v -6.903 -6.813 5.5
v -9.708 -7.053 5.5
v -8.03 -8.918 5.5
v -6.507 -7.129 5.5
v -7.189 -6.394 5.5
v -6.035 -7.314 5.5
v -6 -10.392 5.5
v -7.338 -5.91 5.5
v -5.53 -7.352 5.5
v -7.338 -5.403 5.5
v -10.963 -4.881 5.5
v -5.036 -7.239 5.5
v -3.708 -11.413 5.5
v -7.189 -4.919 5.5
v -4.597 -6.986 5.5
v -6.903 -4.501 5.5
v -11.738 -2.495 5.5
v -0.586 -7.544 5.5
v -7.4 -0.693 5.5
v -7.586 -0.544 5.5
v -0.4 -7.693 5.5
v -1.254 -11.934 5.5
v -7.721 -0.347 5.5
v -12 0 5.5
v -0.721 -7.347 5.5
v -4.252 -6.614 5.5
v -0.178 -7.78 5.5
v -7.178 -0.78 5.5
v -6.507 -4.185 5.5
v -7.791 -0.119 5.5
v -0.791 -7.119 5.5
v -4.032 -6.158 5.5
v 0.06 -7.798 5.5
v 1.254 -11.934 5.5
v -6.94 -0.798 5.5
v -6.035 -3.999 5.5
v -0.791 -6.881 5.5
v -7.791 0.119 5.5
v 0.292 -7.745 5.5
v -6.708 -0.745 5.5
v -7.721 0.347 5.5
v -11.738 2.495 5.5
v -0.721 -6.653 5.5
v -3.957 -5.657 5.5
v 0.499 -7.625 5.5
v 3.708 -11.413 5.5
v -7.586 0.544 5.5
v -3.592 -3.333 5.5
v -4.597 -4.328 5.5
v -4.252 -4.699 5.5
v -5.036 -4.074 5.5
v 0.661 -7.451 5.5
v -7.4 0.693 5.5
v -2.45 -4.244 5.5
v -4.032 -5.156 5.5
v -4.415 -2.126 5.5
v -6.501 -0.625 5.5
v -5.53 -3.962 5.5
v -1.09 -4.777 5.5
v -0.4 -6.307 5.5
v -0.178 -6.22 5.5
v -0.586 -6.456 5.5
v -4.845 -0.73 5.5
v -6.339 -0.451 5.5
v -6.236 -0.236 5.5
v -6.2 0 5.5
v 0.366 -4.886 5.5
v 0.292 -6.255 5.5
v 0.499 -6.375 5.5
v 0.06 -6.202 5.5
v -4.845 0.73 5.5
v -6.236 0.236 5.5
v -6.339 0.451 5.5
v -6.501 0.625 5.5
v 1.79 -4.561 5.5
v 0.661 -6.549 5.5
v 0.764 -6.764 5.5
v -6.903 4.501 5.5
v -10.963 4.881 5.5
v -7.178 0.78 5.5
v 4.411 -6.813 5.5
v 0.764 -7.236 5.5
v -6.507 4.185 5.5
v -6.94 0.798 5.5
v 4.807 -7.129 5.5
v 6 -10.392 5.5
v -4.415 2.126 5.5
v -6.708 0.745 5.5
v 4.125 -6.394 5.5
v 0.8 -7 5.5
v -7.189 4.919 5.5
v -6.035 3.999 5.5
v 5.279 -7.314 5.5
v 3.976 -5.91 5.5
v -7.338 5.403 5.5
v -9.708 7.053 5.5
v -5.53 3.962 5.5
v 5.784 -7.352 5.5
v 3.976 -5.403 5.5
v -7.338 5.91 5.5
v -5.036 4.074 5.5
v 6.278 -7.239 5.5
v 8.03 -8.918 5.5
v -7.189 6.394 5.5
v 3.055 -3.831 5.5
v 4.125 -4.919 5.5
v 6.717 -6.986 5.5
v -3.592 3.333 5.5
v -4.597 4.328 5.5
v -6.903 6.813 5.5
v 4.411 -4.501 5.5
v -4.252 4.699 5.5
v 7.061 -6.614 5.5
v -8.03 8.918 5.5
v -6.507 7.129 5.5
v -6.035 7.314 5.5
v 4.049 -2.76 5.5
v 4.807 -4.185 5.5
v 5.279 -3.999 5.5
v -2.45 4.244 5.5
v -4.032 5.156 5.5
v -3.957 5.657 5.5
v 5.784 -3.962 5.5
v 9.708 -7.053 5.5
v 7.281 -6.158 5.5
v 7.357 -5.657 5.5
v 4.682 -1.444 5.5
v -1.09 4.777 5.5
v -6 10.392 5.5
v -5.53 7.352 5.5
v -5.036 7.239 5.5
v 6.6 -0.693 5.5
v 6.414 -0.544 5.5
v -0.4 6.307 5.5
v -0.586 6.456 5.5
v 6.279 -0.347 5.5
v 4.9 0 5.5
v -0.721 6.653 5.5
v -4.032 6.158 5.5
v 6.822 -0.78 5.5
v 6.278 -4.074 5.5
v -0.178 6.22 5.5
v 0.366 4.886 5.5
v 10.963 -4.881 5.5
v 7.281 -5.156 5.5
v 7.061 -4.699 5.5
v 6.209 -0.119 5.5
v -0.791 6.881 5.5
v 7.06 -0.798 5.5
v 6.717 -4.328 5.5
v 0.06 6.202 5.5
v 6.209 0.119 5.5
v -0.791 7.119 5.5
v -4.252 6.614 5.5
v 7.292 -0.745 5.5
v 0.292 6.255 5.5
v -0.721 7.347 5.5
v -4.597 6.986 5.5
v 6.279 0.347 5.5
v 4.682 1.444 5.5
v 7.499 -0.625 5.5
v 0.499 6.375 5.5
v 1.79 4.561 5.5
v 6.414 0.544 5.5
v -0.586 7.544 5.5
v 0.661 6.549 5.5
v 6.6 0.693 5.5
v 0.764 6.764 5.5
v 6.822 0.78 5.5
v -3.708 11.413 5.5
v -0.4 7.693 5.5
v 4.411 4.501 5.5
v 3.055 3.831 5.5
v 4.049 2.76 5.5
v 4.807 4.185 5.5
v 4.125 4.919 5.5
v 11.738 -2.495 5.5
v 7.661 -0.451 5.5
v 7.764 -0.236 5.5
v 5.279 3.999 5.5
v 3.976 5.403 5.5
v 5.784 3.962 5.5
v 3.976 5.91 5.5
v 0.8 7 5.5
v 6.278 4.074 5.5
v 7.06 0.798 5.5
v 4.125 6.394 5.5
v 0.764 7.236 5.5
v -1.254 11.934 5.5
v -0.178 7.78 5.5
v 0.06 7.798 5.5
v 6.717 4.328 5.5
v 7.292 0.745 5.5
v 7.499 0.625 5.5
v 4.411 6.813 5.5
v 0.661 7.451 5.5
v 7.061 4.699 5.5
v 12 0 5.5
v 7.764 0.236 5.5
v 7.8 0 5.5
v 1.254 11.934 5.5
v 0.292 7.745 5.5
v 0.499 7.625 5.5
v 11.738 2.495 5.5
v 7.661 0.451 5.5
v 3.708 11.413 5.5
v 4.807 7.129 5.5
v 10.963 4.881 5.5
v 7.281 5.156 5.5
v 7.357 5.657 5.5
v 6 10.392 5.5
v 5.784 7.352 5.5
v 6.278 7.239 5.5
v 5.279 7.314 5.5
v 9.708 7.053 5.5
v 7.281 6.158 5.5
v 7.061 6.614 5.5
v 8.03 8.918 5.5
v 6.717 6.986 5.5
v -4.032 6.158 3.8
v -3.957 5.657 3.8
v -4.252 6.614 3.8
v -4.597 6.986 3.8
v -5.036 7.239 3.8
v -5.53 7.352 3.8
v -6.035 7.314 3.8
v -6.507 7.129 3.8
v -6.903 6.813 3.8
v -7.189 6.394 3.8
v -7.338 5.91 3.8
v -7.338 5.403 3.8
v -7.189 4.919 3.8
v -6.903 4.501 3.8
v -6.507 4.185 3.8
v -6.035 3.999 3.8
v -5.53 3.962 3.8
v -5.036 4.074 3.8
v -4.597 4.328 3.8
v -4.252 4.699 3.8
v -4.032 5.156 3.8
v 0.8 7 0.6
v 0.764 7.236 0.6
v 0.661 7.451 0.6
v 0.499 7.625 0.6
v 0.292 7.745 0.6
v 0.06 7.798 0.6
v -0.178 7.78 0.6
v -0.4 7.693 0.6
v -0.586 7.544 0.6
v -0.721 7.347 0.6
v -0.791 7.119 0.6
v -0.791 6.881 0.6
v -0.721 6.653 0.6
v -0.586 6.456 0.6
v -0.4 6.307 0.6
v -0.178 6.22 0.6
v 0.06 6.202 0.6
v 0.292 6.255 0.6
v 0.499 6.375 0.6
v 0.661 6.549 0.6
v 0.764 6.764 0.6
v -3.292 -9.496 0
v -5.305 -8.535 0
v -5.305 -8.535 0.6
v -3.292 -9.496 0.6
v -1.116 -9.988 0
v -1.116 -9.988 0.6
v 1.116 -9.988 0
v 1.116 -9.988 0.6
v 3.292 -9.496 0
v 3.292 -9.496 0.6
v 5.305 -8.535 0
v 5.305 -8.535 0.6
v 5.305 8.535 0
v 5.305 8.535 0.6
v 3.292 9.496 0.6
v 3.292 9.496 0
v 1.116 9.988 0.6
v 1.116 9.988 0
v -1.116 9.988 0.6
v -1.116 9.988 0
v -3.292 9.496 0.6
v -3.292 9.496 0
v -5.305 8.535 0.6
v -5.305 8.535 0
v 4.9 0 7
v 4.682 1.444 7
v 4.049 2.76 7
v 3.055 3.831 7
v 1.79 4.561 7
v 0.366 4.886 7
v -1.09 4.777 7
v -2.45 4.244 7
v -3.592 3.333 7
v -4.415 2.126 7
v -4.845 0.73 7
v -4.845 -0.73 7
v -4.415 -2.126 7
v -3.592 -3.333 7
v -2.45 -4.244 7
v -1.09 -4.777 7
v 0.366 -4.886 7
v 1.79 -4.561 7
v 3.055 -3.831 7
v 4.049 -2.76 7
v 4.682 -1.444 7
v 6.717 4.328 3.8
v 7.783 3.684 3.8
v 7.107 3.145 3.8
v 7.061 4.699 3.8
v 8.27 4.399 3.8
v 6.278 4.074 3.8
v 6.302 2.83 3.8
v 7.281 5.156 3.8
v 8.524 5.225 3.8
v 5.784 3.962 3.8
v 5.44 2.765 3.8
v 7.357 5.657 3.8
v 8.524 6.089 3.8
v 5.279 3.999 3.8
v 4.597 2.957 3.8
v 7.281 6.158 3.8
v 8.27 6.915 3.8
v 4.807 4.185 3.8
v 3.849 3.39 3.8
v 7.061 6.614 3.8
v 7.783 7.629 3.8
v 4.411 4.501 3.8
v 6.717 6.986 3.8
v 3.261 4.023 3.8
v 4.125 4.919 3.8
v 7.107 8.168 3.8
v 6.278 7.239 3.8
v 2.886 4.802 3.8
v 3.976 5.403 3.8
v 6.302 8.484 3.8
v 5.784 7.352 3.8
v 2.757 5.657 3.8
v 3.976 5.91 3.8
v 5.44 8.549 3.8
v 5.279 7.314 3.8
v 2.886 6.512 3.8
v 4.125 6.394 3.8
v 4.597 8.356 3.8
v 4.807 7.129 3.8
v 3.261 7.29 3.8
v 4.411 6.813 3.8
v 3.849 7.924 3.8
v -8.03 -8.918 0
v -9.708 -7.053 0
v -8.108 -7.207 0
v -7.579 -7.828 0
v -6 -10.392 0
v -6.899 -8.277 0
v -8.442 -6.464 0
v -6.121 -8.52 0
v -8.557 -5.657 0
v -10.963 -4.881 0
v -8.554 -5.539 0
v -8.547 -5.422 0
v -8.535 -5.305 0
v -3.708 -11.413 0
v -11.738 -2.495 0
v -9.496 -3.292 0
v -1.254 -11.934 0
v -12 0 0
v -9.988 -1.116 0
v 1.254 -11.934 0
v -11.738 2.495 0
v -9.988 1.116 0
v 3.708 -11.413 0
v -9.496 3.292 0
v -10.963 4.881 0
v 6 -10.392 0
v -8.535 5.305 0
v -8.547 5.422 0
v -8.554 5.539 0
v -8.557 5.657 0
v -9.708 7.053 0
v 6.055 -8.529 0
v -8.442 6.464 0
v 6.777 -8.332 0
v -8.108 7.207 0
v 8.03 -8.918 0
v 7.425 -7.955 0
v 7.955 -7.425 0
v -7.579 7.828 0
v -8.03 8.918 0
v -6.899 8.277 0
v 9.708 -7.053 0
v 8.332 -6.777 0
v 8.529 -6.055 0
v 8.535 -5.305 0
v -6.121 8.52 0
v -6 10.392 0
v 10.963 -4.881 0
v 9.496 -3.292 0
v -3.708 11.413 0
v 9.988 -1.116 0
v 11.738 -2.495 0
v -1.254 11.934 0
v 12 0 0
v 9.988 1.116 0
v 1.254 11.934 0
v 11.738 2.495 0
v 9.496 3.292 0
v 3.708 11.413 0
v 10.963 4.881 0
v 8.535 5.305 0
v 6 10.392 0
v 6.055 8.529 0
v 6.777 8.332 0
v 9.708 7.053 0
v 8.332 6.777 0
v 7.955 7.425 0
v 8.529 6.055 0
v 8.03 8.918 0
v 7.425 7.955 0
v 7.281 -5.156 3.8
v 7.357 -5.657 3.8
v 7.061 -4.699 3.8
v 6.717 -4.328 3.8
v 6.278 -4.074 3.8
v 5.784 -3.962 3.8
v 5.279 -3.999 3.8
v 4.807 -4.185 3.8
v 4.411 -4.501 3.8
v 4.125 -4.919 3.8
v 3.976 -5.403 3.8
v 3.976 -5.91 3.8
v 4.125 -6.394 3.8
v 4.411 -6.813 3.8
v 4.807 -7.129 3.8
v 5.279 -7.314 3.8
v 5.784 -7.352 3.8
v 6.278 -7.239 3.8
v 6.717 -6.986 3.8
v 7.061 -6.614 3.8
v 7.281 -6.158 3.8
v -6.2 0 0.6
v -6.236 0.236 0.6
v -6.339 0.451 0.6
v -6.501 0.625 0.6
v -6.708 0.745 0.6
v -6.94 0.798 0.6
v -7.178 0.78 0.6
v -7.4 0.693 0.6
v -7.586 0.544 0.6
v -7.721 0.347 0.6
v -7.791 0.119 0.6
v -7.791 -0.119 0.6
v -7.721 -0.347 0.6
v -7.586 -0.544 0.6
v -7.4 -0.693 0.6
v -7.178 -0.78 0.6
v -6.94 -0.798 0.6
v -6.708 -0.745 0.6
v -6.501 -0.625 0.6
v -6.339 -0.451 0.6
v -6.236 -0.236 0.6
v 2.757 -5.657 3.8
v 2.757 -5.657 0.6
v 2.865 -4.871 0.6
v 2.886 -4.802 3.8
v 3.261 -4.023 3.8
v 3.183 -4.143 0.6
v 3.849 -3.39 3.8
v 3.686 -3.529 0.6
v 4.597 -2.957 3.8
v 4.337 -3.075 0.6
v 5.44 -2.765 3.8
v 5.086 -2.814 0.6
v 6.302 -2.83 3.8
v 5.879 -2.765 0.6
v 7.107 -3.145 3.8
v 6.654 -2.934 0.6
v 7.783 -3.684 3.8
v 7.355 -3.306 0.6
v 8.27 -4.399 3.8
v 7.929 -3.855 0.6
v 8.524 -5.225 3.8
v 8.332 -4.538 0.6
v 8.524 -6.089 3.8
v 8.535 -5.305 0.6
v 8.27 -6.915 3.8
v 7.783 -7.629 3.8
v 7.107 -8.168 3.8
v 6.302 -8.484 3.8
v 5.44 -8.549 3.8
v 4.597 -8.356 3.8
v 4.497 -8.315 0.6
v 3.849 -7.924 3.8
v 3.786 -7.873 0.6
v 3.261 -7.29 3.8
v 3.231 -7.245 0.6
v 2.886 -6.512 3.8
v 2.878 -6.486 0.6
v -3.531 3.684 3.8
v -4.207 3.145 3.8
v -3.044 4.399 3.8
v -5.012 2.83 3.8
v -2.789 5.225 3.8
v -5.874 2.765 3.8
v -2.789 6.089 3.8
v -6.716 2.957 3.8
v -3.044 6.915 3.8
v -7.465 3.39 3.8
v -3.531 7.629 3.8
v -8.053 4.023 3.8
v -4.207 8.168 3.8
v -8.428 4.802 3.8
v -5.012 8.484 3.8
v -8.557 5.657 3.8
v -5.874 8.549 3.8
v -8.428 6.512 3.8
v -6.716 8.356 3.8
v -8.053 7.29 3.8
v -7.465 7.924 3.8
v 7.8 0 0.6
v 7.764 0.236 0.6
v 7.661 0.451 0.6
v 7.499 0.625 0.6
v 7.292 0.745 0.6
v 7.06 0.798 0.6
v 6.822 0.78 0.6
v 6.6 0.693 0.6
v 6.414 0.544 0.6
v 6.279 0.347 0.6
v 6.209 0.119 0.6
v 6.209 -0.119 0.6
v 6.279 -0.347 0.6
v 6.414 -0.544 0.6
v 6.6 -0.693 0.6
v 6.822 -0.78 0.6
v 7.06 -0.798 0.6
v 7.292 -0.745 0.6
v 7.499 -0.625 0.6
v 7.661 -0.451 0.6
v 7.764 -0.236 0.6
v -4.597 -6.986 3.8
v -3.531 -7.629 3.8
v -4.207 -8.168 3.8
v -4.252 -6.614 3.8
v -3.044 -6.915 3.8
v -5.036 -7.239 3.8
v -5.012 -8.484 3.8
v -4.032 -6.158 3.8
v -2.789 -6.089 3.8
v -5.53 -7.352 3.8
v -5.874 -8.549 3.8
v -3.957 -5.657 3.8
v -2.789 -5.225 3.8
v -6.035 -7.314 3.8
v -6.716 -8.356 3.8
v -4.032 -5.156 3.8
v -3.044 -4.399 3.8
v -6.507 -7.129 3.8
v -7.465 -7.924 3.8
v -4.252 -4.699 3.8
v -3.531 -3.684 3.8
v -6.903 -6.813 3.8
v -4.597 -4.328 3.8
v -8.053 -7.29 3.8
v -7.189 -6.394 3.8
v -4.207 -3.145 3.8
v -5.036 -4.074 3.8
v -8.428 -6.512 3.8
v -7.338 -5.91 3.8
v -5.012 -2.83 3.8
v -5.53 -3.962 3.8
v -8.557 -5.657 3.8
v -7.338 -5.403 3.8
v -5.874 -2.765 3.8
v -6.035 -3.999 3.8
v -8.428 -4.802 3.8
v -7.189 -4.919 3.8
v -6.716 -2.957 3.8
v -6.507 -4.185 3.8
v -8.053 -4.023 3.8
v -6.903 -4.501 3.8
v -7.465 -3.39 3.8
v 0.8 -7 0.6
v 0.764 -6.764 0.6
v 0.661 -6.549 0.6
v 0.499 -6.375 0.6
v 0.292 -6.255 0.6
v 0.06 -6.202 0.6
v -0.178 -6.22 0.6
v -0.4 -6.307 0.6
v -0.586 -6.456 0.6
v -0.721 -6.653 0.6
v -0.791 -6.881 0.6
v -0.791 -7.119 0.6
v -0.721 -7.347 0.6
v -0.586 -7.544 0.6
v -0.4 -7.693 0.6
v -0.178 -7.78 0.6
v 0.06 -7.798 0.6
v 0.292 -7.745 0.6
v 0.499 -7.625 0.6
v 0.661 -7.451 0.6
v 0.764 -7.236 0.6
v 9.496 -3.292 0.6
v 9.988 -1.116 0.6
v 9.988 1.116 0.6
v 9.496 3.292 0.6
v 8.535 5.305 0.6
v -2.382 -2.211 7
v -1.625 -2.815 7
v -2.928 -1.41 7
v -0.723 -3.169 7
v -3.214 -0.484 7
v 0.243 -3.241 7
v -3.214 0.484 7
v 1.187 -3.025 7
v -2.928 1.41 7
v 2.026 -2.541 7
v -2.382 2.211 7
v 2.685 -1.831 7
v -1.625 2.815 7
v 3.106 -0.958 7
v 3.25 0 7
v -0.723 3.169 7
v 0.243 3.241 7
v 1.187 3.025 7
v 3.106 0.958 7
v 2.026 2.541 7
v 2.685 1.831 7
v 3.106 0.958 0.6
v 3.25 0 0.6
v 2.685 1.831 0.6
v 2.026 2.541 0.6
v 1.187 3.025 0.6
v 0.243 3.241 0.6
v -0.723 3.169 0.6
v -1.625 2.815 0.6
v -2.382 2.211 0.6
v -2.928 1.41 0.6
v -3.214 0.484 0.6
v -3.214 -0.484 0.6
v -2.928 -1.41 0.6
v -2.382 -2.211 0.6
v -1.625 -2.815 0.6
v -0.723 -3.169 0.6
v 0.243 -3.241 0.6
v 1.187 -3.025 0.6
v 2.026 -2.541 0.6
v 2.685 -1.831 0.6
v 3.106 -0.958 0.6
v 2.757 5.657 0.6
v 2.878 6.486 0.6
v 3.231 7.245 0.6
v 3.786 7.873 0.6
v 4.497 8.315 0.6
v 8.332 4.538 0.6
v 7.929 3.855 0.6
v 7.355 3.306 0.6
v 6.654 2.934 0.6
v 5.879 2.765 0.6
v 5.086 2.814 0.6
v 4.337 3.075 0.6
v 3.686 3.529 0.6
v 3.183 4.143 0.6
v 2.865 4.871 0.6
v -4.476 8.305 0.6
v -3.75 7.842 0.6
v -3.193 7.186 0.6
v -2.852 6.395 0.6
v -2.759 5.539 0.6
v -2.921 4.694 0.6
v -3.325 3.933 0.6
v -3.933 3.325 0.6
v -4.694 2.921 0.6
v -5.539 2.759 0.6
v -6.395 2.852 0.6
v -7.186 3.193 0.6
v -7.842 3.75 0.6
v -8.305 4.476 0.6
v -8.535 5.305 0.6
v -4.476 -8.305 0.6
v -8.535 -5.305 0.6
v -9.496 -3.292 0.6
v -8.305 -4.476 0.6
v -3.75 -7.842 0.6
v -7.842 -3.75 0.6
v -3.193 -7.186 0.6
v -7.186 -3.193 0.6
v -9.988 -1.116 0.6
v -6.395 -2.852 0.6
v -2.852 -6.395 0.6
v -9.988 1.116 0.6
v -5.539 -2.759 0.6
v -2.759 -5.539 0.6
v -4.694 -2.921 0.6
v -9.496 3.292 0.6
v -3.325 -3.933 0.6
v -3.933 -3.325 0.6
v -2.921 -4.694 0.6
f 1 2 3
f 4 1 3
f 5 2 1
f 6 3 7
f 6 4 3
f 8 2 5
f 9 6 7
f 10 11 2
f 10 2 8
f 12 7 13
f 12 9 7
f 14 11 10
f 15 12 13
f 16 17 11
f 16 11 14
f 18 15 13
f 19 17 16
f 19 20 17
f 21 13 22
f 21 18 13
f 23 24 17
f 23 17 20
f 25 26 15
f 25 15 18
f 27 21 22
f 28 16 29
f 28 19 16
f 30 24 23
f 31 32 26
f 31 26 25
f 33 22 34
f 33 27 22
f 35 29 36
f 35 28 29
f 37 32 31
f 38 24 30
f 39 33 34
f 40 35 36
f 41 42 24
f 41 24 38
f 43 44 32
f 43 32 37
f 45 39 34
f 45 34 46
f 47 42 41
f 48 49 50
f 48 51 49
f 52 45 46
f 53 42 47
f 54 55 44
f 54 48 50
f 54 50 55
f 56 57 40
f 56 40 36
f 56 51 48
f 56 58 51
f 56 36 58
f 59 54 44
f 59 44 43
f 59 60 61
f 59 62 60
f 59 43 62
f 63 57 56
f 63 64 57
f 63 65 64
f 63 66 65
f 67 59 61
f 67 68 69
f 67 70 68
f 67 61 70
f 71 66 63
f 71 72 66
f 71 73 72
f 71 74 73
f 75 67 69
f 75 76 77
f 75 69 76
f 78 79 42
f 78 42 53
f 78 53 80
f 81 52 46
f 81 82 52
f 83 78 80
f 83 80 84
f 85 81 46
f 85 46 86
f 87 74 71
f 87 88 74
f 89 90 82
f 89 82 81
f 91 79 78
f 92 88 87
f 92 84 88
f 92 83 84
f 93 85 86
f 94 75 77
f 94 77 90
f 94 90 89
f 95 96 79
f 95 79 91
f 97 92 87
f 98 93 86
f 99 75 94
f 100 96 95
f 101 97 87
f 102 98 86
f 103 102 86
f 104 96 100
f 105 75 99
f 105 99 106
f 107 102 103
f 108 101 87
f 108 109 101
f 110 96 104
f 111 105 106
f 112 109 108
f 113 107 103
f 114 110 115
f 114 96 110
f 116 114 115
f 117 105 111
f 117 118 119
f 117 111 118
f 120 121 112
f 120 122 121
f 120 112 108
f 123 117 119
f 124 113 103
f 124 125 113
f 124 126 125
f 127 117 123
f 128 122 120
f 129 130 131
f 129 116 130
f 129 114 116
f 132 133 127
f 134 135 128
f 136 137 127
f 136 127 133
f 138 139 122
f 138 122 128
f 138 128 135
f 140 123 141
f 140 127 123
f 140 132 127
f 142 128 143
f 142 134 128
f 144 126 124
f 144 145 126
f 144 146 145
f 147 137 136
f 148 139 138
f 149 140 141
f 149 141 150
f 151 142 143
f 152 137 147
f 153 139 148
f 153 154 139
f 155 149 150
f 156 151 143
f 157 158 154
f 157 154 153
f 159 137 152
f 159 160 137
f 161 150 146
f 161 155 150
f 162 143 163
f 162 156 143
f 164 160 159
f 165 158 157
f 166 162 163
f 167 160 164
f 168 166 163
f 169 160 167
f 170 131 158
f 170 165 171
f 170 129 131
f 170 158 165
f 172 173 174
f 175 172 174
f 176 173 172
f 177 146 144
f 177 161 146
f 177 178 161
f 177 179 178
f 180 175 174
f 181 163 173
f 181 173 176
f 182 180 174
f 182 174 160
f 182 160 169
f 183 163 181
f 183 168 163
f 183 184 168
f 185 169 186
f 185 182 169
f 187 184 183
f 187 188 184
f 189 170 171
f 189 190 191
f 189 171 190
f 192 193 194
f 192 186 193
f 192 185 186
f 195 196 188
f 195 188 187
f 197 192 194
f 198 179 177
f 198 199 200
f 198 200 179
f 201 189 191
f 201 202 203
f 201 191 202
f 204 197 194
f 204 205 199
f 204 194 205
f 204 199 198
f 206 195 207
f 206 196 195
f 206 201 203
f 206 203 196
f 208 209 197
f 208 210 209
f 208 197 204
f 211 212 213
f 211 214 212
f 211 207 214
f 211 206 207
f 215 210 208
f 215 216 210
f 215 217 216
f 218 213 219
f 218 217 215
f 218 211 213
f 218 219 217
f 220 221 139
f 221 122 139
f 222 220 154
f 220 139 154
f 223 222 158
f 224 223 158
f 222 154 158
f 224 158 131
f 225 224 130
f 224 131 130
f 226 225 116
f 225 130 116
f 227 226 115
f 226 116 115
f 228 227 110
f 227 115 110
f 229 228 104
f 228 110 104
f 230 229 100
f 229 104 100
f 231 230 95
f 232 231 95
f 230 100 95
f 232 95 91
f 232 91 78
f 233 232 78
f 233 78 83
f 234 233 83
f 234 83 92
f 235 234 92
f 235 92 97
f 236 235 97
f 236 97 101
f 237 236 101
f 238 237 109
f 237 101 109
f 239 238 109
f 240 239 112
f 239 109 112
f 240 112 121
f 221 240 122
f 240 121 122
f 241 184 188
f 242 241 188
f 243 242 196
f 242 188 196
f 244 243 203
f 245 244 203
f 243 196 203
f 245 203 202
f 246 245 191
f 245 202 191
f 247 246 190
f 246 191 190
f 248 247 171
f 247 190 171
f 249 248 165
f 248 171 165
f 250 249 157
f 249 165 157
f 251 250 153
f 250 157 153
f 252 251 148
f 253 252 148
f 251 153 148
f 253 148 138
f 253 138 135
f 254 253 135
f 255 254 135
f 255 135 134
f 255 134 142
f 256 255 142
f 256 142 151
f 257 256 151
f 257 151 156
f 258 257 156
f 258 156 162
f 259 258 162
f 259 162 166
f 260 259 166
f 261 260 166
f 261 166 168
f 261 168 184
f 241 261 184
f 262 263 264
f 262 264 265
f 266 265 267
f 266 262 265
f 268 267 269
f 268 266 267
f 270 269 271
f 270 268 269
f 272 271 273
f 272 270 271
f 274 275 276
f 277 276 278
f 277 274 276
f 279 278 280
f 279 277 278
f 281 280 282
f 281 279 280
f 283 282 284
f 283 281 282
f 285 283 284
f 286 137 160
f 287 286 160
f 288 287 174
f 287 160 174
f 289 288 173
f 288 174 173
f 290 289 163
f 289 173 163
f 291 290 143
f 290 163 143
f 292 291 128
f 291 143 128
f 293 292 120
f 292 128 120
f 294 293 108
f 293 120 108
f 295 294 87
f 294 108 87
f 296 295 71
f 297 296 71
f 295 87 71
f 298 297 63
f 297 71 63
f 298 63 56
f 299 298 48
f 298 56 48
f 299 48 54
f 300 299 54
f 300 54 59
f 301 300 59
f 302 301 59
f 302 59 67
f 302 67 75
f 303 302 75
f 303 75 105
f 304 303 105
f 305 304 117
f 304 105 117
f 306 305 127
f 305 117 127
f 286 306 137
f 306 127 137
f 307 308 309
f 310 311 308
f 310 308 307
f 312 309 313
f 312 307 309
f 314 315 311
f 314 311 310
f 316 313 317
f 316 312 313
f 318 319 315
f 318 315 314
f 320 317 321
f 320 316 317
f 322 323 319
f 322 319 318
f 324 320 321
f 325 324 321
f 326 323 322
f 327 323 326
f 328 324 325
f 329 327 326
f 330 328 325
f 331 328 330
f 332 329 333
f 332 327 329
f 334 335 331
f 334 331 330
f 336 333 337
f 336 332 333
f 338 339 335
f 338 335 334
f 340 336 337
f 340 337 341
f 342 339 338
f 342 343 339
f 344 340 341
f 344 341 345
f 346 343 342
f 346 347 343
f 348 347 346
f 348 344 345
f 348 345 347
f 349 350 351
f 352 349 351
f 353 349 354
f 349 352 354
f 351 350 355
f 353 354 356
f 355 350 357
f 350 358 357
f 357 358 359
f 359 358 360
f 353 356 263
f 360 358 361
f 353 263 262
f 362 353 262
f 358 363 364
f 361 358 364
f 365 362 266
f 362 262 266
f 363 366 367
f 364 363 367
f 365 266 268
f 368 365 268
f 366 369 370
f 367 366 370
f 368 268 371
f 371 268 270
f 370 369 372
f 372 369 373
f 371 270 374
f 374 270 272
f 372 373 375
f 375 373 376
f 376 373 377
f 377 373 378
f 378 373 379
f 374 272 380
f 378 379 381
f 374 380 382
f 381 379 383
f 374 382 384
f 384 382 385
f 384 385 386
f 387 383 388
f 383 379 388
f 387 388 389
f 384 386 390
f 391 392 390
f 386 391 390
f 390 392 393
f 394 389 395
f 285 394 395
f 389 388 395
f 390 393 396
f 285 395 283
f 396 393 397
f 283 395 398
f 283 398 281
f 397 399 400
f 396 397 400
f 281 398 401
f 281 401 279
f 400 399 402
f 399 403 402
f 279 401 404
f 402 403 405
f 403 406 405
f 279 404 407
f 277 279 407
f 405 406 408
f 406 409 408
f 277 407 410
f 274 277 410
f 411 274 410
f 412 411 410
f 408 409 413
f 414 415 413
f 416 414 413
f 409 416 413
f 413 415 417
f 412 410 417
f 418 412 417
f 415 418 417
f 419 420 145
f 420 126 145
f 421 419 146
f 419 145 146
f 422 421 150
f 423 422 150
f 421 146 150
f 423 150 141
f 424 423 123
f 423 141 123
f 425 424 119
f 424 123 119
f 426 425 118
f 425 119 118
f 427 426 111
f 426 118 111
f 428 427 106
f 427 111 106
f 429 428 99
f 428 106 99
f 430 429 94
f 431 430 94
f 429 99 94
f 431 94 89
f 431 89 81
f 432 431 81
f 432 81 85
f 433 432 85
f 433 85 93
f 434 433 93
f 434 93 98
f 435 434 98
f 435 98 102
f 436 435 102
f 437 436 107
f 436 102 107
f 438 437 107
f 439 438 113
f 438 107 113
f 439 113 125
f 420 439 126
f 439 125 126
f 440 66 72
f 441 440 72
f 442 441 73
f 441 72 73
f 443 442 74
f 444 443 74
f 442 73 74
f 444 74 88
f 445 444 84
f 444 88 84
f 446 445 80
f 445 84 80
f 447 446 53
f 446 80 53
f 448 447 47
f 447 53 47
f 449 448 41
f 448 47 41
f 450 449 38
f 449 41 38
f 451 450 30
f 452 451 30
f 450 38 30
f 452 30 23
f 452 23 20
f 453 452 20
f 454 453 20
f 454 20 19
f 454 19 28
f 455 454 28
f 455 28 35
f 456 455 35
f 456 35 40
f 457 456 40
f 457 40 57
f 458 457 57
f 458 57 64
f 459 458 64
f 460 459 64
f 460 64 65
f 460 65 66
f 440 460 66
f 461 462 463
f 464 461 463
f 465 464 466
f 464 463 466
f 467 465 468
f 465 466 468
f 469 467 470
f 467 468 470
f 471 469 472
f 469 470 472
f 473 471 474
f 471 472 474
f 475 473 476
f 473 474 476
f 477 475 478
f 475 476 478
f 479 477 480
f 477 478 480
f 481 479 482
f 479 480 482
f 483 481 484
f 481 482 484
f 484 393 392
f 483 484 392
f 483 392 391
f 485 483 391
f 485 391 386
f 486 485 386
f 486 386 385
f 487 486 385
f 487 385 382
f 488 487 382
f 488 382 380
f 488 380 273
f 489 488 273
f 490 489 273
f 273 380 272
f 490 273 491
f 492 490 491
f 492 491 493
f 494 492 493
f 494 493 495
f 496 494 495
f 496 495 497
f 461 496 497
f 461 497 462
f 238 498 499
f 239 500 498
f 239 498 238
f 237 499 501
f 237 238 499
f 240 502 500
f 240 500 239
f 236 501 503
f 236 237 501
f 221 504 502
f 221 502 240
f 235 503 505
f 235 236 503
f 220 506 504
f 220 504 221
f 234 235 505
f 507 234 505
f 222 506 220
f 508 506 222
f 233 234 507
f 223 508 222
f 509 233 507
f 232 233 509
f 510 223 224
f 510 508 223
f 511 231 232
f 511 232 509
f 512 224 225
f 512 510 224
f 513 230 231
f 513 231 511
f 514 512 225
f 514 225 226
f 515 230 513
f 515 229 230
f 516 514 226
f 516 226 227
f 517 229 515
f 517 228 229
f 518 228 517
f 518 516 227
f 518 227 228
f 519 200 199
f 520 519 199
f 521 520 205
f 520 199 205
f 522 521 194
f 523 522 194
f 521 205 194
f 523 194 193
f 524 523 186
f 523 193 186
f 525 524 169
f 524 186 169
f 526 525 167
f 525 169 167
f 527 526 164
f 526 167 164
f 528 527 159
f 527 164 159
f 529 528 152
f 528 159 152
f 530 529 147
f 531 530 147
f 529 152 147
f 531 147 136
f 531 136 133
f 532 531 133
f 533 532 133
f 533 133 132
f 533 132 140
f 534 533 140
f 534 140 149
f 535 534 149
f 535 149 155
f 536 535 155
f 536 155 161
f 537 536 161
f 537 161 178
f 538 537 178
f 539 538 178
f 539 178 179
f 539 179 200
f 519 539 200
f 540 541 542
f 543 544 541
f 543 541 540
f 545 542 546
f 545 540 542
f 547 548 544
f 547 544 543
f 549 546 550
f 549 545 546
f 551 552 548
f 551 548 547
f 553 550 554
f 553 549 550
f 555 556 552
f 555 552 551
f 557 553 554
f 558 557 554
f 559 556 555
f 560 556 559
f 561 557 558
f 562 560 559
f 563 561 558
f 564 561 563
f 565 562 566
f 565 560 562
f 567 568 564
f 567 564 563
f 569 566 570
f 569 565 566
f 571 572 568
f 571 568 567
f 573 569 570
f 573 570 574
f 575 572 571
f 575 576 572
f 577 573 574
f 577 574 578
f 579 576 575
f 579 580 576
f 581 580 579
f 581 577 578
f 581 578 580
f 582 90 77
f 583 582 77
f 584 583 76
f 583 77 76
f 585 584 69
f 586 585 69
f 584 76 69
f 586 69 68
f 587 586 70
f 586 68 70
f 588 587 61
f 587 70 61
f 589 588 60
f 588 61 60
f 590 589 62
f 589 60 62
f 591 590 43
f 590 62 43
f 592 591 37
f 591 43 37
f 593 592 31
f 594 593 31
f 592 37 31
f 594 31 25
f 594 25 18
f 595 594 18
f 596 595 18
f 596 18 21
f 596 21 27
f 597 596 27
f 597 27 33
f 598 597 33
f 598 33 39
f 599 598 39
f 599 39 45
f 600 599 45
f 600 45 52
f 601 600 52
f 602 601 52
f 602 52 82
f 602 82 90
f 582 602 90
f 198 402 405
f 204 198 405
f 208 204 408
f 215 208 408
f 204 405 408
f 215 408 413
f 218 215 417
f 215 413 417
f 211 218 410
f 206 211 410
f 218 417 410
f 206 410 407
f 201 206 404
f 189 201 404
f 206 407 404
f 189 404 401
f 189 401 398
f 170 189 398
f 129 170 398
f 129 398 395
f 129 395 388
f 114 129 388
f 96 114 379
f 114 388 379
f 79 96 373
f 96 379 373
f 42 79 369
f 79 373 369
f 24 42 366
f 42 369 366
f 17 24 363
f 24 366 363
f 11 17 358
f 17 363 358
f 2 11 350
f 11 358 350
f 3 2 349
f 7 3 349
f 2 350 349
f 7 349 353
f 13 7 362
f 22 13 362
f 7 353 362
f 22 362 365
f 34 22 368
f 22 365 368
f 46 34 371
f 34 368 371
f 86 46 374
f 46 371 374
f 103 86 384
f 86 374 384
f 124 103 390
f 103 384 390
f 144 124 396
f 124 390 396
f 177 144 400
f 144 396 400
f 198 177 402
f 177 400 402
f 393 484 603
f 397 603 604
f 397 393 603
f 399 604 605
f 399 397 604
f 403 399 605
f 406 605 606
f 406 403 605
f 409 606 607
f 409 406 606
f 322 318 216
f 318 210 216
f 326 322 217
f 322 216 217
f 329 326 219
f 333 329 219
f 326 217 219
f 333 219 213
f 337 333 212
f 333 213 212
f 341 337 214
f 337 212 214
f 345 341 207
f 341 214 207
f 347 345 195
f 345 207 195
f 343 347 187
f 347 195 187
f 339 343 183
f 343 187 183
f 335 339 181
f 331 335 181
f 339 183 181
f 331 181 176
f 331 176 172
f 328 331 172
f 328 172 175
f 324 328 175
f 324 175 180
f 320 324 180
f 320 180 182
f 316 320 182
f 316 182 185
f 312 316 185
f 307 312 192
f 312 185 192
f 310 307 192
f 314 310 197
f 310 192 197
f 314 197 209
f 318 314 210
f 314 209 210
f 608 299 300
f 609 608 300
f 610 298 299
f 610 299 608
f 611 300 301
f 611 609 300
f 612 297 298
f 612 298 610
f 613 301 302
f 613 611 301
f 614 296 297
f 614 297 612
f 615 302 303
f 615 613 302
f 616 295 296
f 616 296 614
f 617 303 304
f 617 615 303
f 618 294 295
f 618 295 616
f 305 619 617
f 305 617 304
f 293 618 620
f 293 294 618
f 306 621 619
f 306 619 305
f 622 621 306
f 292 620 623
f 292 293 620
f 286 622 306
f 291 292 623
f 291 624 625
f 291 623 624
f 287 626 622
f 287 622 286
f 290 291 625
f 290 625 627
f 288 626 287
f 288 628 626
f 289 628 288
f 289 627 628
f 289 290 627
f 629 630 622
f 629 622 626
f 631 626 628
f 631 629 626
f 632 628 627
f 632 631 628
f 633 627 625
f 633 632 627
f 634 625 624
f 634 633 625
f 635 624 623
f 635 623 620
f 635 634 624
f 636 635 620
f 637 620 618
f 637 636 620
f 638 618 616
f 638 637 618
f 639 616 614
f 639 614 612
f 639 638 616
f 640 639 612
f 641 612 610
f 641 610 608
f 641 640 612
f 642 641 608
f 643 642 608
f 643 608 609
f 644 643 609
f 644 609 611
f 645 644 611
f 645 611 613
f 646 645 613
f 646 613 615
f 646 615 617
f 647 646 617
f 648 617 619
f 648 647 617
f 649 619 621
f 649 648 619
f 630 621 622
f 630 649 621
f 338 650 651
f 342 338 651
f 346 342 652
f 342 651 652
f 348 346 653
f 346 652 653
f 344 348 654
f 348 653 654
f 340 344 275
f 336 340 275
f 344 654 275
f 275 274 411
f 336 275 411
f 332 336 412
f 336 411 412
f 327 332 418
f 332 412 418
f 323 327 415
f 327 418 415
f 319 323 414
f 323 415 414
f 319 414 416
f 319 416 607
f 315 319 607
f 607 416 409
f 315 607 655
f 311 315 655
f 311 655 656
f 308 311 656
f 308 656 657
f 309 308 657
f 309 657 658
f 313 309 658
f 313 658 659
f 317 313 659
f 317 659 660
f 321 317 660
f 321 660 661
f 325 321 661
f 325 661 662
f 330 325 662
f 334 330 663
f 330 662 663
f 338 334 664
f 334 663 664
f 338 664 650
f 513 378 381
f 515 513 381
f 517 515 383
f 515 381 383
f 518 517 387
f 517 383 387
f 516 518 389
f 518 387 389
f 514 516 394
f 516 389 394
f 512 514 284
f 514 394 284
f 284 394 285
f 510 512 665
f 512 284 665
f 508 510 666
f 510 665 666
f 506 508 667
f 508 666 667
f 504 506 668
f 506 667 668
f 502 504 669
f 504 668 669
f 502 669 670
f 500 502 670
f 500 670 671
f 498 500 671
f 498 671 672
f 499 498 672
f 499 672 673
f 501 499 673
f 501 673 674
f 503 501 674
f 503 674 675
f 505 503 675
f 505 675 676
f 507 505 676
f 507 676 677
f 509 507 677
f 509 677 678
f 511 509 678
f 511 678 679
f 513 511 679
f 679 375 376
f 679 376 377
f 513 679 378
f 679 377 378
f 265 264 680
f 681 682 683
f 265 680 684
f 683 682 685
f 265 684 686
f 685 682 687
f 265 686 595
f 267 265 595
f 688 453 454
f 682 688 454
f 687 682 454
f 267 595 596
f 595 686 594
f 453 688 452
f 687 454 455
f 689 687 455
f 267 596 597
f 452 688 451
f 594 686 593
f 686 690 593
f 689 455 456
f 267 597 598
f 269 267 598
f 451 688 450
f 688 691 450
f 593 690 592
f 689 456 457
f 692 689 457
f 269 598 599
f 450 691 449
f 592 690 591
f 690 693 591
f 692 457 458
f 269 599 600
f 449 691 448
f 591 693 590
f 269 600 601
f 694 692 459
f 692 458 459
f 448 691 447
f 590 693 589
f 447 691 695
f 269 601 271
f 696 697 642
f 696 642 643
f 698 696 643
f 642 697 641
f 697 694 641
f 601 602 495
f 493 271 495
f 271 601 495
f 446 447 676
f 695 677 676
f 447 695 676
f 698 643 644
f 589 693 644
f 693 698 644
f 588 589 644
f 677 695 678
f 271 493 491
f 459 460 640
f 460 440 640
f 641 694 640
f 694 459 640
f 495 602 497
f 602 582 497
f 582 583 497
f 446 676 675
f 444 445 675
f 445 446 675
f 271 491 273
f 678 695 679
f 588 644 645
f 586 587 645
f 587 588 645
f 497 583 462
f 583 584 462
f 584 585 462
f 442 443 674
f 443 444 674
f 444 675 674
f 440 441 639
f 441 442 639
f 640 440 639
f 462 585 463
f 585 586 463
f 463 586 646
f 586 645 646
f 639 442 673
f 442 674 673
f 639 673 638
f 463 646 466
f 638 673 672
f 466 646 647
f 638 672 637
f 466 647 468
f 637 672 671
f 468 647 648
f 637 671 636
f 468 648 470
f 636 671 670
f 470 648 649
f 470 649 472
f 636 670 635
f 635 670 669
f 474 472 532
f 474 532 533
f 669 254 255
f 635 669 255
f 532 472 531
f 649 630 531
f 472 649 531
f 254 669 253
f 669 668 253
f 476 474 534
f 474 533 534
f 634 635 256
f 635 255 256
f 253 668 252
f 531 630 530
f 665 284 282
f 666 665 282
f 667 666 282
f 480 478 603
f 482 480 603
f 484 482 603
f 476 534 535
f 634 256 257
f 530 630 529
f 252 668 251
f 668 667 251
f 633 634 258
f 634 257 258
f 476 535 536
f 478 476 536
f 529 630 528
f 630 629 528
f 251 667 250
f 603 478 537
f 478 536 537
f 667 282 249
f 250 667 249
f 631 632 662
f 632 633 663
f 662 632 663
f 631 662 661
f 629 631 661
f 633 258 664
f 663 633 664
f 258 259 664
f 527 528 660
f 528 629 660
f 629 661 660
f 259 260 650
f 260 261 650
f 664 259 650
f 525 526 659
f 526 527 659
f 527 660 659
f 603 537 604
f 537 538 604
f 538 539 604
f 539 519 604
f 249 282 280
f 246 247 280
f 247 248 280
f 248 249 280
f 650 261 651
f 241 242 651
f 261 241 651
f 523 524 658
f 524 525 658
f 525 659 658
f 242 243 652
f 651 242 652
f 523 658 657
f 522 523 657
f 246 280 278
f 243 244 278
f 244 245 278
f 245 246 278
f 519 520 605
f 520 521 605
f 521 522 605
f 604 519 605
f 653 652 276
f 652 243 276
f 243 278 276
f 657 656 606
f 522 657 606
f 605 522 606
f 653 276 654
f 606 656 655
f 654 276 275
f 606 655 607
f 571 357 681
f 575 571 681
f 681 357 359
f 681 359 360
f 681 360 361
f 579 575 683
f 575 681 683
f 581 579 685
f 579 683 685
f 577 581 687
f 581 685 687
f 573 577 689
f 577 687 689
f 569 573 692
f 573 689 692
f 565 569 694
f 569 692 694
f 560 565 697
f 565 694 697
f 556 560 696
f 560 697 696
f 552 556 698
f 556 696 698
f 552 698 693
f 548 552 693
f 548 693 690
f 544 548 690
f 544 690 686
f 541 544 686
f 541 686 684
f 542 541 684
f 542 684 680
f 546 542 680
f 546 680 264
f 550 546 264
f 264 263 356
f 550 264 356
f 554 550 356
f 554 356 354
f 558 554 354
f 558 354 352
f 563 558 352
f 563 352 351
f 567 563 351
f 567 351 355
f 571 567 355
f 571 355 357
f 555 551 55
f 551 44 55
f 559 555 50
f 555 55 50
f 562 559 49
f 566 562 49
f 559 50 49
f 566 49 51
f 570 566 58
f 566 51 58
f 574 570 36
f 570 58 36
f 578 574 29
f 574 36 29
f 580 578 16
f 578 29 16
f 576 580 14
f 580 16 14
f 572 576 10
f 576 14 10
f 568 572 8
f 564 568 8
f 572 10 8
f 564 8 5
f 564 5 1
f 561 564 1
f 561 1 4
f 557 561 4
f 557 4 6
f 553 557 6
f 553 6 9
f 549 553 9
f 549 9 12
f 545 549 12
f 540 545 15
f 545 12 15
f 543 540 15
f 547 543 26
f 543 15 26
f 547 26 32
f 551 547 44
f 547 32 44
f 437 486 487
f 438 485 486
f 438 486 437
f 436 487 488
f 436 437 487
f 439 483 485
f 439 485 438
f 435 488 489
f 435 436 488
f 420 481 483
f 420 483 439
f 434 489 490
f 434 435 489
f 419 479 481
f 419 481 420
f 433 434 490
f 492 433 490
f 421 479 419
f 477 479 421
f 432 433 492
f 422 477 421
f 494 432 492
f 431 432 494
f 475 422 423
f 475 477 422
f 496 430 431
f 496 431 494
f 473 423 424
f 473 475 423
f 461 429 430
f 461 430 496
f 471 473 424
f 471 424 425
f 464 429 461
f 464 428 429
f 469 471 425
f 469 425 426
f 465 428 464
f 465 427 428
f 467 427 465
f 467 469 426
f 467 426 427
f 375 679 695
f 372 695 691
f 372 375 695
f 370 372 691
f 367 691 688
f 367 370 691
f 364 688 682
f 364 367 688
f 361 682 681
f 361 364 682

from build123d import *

# Parameters (mm, degrees)
D24_5_5_D6_5_2_R                = 12
D24_5_5_D6_5_2_R_2              = 3.25
D24_5_5_D6_5_DEPTH              = 5.5
EXTRUDE_START                   = 5.5
SKETCH_D9_8_1_5_R               = 4.9
SKETCH_D9_8_1_5_R_2             = 3.25
EXTRUDE_D9_8_1_5_DEPTH          = 1.5
F_4XD3_4_D5_8_PCD16_D           = 3.4
F_4XD3_4_D5_8_PCD16_CBORE_D     = 5.8
F_4XD3_4_D5_8_PCD16_CBORE_DEPTH = 3.8
SKETCH_1093_R                   = 10.05
CUT_EXTRUDE_D20_1_0_6_DEPTH     = 0.6
F_4XM2X0_4_PCD14_D              = 1.6


with BuildPart() as part:
    # D24__5.5__D6.5 2 → D24__5.5__D6.5 (new body)
    with BuildSketch(Plane.XY):
        Circle(D24_5_5_D6_5_2_R)
        Circle(D24_5_5_D6_5_2_R_2, mode=Mode.SUBTRACT)
    extrude(amount=D24_5_5_D6_5_DEPTH)

    # 轴承内孔定位台_D9.8_高1.5_截面 → 轴承内孔定位台_D9.8_高1.5 (add)
    with BuildSketch(Plane.XY.offset(EXTRUDE_START)):
        Circle(SKETCH_D9_8_1_5_R)
        Circle(SKETCH_D9_8_1_5_R_2, mode=Mode.SUBTRACT)
    extrude(amount=EXTRUDE_D9_8_1_5_DEPTH)

    # 轴承内圈_4xD3.4通孔_D5.8沉孔_PCD16 (through all)
    with Locations(Plane(origin=(5.656854249, -5.656854249, 0), x_dir=(-1, 0, 0), z_dir=(0, 0, -1))):
        with Locations((0, 0), (11.313708498, 0), (11.313708498, 11.313708498), (0, 11.313708498)):
            CounterBoreHole(F_4XD3_4_D5_8_PCD16_D / 2, F_4XD3_4_D5_8_PCD16_CBORE_D / 2, F_4XD3_4_D5_8_PCD16_CBORE_DEPTH)

    # Sketch 1093 → 原舵盘定位槽_D20.1_深0.6 (cut)
    with BuildSketch(Plane.XY):
        Circle(SKETCH_1093_R)
    extrude(amount=CUT_EXTRUDE_D20_1_0_6_DEPTH, mode=Mode.SUBTRACT)

    # 原舵盘_4xM2x0.4通螺纹_PCD14 (through all)
    with Locations(Plane(origin=(0, -7, 0.6), x_dir=(-1, 0, 0), z_dir=(0, 0, -1))):
        with Locations((0, 0), (7, 7), (0, 14), (-7, 7)):
            Hole(F_4XM2X0_4_PCD14_D / 2)


solid = part.part
